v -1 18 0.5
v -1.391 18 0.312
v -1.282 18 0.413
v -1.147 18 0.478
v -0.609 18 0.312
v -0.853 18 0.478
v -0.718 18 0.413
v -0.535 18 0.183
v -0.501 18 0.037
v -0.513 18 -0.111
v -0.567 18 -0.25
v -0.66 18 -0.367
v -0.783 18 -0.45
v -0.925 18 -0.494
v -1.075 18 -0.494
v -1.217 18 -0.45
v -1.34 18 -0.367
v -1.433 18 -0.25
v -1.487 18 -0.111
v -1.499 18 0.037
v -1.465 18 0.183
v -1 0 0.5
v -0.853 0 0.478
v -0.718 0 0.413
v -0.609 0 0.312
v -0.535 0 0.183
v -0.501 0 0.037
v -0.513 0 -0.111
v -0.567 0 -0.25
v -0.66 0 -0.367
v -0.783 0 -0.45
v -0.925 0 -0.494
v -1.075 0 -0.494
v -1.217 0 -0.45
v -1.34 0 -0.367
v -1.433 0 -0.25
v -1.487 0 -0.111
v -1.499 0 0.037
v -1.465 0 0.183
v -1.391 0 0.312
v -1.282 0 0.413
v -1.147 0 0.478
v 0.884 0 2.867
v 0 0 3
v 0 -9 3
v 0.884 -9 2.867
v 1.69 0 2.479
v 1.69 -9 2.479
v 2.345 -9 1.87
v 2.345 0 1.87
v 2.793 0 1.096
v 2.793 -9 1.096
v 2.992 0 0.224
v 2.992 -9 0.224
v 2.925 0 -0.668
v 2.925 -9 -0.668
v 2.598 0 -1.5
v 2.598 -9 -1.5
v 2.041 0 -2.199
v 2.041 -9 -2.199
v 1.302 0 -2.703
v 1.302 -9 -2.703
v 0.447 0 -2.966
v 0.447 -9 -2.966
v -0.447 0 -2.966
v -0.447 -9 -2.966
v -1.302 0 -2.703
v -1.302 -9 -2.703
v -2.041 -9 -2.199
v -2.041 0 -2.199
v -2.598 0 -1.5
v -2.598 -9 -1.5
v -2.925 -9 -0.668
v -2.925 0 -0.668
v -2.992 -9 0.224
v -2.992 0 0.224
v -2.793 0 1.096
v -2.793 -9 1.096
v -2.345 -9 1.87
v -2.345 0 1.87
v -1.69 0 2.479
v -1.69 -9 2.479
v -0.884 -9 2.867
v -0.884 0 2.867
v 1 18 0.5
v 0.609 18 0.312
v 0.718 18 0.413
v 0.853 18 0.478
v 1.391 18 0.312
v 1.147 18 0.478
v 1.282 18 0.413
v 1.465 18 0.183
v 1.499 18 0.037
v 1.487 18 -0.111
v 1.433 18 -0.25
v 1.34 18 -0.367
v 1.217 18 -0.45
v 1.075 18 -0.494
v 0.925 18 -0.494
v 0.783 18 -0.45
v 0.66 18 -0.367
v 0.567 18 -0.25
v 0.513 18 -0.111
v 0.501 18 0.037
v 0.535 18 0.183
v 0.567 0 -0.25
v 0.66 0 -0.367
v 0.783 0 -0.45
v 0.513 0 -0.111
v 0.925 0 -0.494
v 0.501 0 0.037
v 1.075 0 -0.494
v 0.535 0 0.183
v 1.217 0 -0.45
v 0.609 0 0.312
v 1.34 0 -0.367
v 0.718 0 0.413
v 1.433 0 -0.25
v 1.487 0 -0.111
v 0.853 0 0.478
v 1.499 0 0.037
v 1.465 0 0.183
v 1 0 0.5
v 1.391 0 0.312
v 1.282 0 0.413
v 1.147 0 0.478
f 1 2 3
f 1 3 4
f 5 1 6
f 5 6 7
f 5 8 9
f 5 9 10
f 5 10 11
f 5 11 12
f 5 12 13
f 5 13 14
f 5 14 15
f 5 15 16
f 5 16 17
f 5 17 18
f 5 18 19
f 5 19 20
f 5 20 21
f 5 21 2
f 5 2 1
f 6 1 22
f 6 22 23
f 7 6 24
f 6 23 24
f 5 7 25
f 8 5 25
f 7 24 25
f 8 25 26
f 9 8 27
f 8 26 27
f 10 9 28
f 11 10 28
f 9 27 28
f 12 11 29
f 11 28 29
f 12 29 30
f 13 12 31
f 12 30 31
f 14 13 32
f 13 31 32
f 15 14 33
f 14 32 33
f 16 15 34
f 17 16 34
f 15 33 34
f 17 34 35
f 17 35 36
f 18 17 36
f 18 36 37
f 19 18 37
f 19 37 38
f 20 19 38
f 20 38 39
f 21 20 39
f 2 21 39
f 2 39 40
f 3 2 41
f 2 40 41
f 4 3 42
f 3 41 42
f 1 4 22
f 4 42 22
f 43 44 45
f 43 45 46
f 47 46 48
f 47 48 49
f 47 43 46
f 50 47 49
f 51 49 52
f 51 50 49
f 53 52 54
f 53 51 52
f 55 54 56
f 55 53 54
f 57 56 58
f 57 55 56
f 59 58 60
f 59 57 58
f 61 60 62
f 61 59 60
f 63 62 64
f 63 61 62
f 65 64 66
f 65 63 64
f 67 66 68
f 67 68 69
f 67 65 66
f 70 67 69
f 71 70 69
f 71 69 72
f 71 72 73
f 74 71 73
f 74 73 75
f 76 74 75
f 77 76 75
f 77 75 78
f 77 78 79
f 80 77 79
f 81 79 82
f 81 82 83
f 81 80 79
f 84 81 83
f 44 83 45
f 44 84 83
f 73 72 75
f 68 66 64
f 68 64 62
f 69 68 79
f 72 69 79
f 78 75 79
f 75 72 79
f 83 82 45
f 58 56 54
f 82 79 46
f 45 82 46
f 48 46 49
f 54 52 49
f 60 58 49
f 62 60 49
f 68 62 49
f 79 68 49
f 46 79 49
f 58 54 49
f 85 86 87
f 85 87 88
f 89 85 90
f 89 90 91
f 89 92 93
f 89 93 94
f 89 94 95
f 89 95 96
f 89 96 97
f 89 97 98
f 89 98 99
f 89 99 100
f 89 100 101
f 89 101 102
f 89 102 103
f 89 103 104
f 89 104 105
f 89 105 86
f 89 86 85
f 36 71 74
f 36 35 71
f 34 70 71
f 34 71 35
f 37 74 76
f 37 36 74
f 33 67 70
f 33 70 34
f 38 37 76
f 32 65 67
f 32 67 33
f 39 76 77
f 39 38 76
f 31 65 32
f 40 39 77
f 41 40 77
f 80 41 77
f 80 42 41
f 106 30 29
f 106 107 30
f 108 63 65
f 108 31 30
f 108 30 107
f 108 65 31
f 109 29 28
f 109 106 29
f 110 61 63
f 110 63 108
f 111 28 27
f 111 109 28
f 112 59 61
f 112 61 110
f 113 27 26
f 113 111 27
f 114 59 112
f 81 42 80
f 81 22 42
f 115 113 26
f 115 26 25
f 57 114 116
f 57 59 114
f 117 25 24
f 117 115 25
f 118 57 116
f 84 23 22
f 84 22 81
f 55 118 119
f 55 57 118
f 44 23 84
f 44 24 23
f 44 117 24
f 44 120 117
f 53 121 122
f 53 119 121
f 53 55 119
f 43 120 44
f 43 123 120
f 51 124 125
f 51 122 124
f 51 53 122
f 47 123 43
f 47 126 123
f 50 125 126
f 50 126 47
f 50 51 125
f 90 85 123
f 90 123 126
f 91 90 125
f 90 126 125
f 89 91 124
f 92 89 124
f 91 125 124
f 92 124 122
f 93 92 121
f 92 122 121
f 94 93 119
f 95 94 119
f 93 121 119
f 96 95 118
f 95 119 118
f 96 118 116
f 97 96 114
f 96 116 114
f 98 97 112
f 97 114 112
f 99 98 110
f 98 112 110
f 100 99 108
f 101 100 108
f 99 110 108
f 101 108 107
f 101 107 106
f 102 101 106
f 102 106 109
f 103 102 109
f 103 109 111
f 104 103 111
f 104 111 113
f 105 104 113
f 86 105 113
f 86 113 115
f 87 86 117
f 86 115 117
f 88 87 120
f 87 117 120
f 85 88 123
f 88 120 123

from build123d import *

# Parameters (mm, degrees)
SKETCH1_R  = 3
HEAD_DEPTH = 9
SKETCH2_R  = 0.5
PINS_DEPTH = 18


with BuildPart() as part:
    # Sketch1 → Head (new body)
    with BuildSketch(Plane(origin=(0, 0, 0), x_dir=(1, 0, 0), z_dir=(0, 1, 0))):
        with Locations(Location((0, 0, 0), (0, 0, 270))):
            Circle(SKETCH1_R)
    extrude(amount=-HEAD_DEPTH)

    # Sketch2 → Pins (add)
    with BuildSketch(Plane(origin=(0, 0, 0), x_dir=(1, 0, 0), z_dir=(0, 1, 0))):
        with Locations(Location((-1, 0, 0), (0, 0, 270))):
            Circle(SKETCH2_R)
        with Locations(Location((1, 0, 0), (0, 0, 270))):
            Circle(SKETCH2_R)
    extrude(amount=PINS_DEPTH)


solid = part.part
